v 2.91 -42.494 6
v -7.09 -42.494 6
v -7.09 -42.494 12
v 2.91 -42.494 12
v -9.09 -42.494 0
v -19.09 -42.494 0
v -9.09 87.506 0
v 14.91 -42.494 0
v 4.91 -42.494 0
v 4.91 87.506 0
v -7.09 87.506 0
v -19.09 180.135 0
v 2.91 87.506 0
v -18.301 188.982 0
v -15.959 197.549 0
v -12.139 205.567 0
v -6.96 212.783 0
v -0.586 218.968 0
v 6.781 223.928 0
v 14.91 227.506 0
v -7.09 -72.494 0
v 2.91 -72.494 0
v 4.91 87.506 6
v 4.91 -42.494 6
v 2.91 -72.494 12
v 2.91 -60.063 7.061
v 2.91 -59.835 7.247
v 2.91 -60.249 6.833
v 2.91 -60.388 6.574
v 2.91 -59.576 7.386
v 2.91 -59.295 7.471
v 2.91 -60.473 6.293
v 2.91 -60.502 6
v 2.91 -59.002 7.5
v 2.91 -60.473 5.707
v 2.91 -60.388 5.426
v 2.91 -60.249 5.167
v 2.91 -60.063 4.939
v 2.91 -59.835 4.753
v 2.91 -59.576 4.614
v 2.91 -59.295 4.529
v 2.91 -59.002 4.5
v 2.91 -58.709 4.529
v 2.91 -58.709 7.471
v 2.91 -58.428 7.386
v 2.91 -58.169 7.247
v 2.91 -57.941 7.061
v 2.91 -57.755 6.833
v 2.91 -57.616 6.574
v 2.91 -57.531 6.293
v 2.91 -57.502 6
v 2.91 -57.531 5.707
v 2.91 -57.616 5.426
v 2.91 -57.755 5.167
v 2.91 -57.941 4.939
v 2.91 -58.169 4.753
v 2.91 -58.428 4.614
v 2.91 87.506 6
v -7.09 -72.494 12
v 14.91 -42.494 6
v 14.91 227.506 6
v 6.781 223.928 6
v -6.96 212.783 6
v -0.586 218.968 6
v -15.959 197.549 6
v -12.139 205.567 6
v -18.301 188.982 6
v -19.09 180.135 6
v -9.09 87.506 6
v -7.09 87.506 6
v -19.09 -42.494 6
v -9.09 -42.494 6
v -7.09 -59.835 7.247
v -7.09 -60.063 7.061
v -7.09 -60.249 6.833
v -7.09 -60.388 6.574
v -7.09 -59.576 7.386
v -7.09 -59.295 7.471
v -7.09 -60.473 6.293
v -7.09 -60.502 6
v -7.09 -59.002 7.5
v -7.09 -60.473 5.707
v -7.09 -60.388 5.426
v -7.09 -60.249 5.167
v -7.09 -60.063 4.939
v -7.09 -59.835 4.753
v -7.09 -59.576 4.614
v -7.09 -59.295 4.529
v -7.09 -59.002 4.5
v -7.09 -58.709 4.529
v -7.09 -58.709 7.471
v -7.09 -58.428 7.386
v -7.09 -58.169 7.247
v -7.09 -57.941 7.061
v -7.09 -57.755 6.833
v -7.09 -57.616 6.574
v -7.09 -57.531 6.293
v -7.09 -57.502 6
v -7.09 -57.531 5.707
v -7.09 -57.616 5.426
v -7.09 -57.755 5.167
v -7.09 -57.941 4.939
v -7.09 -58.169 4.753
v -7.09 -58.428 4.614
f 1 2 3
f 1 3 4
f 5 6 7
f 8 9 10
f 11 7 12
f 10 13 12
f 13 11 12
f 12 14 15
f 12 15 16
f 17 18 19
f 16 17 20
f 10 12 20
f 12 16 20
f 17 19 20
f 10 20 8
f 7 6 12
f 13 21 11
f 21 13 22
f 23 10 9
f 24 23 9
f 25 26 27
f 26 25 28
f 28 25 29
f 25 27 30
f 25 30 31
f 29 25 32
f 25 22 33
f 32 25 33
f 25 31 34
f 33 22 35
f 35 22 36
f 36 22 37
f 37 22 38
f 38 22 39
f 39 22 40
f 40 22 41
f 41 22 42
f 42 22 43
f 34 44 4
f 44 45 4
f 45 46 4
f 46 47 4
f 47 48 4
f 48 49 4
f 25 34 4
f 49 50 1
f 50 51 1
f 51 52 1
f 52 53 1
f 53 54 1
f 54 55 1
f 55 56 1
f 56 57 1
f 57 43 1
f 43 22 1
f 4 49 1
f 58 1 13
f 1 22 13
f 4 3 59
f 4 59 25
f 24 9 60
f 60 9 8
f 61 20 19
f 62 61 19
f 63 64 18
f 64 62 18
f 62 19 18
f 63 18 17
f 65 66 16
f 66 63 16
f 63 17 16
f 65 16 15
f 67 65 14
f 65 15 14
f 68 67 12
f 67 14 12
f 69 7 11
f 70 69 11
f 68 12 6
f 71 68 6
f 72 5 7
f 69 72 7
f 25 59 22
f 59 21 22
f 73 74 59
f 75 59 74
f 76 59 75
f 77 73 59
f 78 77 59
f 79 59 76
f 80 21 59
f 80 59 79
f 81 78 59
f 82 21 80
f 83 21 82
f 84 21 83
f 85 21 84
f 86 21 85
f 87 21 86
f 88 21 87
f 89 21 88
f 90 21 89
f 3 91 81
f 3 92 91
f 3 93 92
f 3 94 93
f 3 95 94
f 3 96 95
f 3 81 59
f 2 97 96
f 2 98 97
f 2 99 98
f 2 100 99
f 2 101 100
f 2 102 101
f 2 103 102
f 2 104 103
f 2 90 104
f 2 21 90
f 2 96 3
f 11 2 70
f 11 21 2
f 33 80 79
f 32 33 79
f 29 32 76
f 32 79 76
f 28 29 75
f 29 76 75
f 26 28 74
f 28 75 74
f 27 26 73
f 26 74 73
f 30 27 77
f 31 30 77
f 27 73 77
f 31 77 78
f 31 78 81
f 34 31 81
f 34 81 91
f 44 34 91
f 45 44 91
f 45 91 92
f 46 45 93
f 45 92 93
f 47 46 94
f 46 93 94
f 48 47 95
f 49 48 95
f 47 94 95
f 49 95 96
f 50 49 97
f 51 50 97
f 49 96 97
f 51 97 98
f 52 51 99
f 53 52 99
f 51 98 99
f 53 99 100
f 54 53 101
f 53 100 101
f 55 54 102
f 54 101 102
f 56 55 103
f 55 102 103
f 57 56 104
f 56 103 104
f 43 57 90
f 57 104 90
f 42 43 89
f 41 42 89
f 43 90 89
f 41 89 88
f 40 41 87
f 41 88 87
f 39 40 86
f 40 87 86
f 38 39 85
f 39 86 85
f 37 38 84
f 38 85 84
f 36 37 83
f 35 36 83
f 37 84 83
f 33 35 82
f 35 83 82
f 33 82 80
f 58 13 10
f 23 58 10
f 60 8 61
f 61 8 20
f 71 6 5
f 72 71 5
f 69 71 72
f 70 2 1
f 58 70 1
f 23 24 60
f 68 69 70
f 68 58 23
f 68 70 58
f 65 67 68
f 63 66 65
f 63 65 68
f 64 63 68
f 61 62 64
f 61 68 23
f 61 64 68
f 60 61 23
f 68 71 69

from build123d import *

# Parameters (mm, degrees)
F1_DEPTH    = 6
F2_T1_DEPTH = 242.8543856465
F3_W        = 10
F3_H        = 30
F4_DEPTH    = 6
F5_R        = 1.5
F6_DEPTH    = 10


# Not quite as in the source:
# - a fillet or chamfer that OpenCascade refuses, or shapes differently, is made with other operations: its cross-section is extruded or revolved along the edge and cut away or added


with BuildPart() as f1:
    # F0 (on Top) → F1 (new body)
    with BuildSketch(Plane.XY):
        Polygon((14.9102990106, 227.5062542017), (-19.0897009894, 227.5062542017), (-19.0897009894, -42.4937457983), (-9.0897009894, -42.4937457983), (-9.0897009894, 87.5062542017), (-7.0897009894, 87.5062542017), (-7.0897009894, -72.4937457983), (2.9102990106, -72.4937457983), (2.9102990106, 87.5062542017), (4.9102990106, 87.5062542017), (4.9102990106, -42.4937457983), (14.9102990106, -42.4937457983), align=None)
    extrude(amount=F1_DEPTH)

    # F2: fillet of radius 50 on 1 edges, made by hand

    # F2_s2 → F2_t1 (cut)
    with BuildSketch(Plane.XY.offset(-118.4271928233)):
        with BuildLine():
            ThreePointArc((14.9102990106, 227.5062542017), (-9.7098930126, 209.2901365467), (-19.0897009894, 180.1353770724))
            Line((-19.0897009894, 180.1353770724), (-19.0897009894, 227.5062542017))
            Line((-19.0897009894, 227.5062542017), (14.9102990106, 227.5062542017))
        make_face()
    extrude(amount=F2_T1_DEPTH, mode=Mode.SUBTRACT)

    # F3 (on face) → F4 (join)
    with BuildSketch(Plane.XY.offset(6)):
        with Locations((-2.0897009894, -57.4937457983)):
            Rectangle(F3_W, F3_H)
    extrude(amount=F4_DEPTH)

    # F5 (on face) → F6 (cut, through all)
    with BuildSketch(Plane(origin=(-7.0897009894, 0, 0), x_dir=(0, -1, 0), z_dir=(-1, 0, 0))):
        with Locations((59.0019002557, 6)):
            Circle(F5_R)
    extrude(amount=-F6_DEPTH, mode=Mode.SUBTRACT)


solid = f1.part
